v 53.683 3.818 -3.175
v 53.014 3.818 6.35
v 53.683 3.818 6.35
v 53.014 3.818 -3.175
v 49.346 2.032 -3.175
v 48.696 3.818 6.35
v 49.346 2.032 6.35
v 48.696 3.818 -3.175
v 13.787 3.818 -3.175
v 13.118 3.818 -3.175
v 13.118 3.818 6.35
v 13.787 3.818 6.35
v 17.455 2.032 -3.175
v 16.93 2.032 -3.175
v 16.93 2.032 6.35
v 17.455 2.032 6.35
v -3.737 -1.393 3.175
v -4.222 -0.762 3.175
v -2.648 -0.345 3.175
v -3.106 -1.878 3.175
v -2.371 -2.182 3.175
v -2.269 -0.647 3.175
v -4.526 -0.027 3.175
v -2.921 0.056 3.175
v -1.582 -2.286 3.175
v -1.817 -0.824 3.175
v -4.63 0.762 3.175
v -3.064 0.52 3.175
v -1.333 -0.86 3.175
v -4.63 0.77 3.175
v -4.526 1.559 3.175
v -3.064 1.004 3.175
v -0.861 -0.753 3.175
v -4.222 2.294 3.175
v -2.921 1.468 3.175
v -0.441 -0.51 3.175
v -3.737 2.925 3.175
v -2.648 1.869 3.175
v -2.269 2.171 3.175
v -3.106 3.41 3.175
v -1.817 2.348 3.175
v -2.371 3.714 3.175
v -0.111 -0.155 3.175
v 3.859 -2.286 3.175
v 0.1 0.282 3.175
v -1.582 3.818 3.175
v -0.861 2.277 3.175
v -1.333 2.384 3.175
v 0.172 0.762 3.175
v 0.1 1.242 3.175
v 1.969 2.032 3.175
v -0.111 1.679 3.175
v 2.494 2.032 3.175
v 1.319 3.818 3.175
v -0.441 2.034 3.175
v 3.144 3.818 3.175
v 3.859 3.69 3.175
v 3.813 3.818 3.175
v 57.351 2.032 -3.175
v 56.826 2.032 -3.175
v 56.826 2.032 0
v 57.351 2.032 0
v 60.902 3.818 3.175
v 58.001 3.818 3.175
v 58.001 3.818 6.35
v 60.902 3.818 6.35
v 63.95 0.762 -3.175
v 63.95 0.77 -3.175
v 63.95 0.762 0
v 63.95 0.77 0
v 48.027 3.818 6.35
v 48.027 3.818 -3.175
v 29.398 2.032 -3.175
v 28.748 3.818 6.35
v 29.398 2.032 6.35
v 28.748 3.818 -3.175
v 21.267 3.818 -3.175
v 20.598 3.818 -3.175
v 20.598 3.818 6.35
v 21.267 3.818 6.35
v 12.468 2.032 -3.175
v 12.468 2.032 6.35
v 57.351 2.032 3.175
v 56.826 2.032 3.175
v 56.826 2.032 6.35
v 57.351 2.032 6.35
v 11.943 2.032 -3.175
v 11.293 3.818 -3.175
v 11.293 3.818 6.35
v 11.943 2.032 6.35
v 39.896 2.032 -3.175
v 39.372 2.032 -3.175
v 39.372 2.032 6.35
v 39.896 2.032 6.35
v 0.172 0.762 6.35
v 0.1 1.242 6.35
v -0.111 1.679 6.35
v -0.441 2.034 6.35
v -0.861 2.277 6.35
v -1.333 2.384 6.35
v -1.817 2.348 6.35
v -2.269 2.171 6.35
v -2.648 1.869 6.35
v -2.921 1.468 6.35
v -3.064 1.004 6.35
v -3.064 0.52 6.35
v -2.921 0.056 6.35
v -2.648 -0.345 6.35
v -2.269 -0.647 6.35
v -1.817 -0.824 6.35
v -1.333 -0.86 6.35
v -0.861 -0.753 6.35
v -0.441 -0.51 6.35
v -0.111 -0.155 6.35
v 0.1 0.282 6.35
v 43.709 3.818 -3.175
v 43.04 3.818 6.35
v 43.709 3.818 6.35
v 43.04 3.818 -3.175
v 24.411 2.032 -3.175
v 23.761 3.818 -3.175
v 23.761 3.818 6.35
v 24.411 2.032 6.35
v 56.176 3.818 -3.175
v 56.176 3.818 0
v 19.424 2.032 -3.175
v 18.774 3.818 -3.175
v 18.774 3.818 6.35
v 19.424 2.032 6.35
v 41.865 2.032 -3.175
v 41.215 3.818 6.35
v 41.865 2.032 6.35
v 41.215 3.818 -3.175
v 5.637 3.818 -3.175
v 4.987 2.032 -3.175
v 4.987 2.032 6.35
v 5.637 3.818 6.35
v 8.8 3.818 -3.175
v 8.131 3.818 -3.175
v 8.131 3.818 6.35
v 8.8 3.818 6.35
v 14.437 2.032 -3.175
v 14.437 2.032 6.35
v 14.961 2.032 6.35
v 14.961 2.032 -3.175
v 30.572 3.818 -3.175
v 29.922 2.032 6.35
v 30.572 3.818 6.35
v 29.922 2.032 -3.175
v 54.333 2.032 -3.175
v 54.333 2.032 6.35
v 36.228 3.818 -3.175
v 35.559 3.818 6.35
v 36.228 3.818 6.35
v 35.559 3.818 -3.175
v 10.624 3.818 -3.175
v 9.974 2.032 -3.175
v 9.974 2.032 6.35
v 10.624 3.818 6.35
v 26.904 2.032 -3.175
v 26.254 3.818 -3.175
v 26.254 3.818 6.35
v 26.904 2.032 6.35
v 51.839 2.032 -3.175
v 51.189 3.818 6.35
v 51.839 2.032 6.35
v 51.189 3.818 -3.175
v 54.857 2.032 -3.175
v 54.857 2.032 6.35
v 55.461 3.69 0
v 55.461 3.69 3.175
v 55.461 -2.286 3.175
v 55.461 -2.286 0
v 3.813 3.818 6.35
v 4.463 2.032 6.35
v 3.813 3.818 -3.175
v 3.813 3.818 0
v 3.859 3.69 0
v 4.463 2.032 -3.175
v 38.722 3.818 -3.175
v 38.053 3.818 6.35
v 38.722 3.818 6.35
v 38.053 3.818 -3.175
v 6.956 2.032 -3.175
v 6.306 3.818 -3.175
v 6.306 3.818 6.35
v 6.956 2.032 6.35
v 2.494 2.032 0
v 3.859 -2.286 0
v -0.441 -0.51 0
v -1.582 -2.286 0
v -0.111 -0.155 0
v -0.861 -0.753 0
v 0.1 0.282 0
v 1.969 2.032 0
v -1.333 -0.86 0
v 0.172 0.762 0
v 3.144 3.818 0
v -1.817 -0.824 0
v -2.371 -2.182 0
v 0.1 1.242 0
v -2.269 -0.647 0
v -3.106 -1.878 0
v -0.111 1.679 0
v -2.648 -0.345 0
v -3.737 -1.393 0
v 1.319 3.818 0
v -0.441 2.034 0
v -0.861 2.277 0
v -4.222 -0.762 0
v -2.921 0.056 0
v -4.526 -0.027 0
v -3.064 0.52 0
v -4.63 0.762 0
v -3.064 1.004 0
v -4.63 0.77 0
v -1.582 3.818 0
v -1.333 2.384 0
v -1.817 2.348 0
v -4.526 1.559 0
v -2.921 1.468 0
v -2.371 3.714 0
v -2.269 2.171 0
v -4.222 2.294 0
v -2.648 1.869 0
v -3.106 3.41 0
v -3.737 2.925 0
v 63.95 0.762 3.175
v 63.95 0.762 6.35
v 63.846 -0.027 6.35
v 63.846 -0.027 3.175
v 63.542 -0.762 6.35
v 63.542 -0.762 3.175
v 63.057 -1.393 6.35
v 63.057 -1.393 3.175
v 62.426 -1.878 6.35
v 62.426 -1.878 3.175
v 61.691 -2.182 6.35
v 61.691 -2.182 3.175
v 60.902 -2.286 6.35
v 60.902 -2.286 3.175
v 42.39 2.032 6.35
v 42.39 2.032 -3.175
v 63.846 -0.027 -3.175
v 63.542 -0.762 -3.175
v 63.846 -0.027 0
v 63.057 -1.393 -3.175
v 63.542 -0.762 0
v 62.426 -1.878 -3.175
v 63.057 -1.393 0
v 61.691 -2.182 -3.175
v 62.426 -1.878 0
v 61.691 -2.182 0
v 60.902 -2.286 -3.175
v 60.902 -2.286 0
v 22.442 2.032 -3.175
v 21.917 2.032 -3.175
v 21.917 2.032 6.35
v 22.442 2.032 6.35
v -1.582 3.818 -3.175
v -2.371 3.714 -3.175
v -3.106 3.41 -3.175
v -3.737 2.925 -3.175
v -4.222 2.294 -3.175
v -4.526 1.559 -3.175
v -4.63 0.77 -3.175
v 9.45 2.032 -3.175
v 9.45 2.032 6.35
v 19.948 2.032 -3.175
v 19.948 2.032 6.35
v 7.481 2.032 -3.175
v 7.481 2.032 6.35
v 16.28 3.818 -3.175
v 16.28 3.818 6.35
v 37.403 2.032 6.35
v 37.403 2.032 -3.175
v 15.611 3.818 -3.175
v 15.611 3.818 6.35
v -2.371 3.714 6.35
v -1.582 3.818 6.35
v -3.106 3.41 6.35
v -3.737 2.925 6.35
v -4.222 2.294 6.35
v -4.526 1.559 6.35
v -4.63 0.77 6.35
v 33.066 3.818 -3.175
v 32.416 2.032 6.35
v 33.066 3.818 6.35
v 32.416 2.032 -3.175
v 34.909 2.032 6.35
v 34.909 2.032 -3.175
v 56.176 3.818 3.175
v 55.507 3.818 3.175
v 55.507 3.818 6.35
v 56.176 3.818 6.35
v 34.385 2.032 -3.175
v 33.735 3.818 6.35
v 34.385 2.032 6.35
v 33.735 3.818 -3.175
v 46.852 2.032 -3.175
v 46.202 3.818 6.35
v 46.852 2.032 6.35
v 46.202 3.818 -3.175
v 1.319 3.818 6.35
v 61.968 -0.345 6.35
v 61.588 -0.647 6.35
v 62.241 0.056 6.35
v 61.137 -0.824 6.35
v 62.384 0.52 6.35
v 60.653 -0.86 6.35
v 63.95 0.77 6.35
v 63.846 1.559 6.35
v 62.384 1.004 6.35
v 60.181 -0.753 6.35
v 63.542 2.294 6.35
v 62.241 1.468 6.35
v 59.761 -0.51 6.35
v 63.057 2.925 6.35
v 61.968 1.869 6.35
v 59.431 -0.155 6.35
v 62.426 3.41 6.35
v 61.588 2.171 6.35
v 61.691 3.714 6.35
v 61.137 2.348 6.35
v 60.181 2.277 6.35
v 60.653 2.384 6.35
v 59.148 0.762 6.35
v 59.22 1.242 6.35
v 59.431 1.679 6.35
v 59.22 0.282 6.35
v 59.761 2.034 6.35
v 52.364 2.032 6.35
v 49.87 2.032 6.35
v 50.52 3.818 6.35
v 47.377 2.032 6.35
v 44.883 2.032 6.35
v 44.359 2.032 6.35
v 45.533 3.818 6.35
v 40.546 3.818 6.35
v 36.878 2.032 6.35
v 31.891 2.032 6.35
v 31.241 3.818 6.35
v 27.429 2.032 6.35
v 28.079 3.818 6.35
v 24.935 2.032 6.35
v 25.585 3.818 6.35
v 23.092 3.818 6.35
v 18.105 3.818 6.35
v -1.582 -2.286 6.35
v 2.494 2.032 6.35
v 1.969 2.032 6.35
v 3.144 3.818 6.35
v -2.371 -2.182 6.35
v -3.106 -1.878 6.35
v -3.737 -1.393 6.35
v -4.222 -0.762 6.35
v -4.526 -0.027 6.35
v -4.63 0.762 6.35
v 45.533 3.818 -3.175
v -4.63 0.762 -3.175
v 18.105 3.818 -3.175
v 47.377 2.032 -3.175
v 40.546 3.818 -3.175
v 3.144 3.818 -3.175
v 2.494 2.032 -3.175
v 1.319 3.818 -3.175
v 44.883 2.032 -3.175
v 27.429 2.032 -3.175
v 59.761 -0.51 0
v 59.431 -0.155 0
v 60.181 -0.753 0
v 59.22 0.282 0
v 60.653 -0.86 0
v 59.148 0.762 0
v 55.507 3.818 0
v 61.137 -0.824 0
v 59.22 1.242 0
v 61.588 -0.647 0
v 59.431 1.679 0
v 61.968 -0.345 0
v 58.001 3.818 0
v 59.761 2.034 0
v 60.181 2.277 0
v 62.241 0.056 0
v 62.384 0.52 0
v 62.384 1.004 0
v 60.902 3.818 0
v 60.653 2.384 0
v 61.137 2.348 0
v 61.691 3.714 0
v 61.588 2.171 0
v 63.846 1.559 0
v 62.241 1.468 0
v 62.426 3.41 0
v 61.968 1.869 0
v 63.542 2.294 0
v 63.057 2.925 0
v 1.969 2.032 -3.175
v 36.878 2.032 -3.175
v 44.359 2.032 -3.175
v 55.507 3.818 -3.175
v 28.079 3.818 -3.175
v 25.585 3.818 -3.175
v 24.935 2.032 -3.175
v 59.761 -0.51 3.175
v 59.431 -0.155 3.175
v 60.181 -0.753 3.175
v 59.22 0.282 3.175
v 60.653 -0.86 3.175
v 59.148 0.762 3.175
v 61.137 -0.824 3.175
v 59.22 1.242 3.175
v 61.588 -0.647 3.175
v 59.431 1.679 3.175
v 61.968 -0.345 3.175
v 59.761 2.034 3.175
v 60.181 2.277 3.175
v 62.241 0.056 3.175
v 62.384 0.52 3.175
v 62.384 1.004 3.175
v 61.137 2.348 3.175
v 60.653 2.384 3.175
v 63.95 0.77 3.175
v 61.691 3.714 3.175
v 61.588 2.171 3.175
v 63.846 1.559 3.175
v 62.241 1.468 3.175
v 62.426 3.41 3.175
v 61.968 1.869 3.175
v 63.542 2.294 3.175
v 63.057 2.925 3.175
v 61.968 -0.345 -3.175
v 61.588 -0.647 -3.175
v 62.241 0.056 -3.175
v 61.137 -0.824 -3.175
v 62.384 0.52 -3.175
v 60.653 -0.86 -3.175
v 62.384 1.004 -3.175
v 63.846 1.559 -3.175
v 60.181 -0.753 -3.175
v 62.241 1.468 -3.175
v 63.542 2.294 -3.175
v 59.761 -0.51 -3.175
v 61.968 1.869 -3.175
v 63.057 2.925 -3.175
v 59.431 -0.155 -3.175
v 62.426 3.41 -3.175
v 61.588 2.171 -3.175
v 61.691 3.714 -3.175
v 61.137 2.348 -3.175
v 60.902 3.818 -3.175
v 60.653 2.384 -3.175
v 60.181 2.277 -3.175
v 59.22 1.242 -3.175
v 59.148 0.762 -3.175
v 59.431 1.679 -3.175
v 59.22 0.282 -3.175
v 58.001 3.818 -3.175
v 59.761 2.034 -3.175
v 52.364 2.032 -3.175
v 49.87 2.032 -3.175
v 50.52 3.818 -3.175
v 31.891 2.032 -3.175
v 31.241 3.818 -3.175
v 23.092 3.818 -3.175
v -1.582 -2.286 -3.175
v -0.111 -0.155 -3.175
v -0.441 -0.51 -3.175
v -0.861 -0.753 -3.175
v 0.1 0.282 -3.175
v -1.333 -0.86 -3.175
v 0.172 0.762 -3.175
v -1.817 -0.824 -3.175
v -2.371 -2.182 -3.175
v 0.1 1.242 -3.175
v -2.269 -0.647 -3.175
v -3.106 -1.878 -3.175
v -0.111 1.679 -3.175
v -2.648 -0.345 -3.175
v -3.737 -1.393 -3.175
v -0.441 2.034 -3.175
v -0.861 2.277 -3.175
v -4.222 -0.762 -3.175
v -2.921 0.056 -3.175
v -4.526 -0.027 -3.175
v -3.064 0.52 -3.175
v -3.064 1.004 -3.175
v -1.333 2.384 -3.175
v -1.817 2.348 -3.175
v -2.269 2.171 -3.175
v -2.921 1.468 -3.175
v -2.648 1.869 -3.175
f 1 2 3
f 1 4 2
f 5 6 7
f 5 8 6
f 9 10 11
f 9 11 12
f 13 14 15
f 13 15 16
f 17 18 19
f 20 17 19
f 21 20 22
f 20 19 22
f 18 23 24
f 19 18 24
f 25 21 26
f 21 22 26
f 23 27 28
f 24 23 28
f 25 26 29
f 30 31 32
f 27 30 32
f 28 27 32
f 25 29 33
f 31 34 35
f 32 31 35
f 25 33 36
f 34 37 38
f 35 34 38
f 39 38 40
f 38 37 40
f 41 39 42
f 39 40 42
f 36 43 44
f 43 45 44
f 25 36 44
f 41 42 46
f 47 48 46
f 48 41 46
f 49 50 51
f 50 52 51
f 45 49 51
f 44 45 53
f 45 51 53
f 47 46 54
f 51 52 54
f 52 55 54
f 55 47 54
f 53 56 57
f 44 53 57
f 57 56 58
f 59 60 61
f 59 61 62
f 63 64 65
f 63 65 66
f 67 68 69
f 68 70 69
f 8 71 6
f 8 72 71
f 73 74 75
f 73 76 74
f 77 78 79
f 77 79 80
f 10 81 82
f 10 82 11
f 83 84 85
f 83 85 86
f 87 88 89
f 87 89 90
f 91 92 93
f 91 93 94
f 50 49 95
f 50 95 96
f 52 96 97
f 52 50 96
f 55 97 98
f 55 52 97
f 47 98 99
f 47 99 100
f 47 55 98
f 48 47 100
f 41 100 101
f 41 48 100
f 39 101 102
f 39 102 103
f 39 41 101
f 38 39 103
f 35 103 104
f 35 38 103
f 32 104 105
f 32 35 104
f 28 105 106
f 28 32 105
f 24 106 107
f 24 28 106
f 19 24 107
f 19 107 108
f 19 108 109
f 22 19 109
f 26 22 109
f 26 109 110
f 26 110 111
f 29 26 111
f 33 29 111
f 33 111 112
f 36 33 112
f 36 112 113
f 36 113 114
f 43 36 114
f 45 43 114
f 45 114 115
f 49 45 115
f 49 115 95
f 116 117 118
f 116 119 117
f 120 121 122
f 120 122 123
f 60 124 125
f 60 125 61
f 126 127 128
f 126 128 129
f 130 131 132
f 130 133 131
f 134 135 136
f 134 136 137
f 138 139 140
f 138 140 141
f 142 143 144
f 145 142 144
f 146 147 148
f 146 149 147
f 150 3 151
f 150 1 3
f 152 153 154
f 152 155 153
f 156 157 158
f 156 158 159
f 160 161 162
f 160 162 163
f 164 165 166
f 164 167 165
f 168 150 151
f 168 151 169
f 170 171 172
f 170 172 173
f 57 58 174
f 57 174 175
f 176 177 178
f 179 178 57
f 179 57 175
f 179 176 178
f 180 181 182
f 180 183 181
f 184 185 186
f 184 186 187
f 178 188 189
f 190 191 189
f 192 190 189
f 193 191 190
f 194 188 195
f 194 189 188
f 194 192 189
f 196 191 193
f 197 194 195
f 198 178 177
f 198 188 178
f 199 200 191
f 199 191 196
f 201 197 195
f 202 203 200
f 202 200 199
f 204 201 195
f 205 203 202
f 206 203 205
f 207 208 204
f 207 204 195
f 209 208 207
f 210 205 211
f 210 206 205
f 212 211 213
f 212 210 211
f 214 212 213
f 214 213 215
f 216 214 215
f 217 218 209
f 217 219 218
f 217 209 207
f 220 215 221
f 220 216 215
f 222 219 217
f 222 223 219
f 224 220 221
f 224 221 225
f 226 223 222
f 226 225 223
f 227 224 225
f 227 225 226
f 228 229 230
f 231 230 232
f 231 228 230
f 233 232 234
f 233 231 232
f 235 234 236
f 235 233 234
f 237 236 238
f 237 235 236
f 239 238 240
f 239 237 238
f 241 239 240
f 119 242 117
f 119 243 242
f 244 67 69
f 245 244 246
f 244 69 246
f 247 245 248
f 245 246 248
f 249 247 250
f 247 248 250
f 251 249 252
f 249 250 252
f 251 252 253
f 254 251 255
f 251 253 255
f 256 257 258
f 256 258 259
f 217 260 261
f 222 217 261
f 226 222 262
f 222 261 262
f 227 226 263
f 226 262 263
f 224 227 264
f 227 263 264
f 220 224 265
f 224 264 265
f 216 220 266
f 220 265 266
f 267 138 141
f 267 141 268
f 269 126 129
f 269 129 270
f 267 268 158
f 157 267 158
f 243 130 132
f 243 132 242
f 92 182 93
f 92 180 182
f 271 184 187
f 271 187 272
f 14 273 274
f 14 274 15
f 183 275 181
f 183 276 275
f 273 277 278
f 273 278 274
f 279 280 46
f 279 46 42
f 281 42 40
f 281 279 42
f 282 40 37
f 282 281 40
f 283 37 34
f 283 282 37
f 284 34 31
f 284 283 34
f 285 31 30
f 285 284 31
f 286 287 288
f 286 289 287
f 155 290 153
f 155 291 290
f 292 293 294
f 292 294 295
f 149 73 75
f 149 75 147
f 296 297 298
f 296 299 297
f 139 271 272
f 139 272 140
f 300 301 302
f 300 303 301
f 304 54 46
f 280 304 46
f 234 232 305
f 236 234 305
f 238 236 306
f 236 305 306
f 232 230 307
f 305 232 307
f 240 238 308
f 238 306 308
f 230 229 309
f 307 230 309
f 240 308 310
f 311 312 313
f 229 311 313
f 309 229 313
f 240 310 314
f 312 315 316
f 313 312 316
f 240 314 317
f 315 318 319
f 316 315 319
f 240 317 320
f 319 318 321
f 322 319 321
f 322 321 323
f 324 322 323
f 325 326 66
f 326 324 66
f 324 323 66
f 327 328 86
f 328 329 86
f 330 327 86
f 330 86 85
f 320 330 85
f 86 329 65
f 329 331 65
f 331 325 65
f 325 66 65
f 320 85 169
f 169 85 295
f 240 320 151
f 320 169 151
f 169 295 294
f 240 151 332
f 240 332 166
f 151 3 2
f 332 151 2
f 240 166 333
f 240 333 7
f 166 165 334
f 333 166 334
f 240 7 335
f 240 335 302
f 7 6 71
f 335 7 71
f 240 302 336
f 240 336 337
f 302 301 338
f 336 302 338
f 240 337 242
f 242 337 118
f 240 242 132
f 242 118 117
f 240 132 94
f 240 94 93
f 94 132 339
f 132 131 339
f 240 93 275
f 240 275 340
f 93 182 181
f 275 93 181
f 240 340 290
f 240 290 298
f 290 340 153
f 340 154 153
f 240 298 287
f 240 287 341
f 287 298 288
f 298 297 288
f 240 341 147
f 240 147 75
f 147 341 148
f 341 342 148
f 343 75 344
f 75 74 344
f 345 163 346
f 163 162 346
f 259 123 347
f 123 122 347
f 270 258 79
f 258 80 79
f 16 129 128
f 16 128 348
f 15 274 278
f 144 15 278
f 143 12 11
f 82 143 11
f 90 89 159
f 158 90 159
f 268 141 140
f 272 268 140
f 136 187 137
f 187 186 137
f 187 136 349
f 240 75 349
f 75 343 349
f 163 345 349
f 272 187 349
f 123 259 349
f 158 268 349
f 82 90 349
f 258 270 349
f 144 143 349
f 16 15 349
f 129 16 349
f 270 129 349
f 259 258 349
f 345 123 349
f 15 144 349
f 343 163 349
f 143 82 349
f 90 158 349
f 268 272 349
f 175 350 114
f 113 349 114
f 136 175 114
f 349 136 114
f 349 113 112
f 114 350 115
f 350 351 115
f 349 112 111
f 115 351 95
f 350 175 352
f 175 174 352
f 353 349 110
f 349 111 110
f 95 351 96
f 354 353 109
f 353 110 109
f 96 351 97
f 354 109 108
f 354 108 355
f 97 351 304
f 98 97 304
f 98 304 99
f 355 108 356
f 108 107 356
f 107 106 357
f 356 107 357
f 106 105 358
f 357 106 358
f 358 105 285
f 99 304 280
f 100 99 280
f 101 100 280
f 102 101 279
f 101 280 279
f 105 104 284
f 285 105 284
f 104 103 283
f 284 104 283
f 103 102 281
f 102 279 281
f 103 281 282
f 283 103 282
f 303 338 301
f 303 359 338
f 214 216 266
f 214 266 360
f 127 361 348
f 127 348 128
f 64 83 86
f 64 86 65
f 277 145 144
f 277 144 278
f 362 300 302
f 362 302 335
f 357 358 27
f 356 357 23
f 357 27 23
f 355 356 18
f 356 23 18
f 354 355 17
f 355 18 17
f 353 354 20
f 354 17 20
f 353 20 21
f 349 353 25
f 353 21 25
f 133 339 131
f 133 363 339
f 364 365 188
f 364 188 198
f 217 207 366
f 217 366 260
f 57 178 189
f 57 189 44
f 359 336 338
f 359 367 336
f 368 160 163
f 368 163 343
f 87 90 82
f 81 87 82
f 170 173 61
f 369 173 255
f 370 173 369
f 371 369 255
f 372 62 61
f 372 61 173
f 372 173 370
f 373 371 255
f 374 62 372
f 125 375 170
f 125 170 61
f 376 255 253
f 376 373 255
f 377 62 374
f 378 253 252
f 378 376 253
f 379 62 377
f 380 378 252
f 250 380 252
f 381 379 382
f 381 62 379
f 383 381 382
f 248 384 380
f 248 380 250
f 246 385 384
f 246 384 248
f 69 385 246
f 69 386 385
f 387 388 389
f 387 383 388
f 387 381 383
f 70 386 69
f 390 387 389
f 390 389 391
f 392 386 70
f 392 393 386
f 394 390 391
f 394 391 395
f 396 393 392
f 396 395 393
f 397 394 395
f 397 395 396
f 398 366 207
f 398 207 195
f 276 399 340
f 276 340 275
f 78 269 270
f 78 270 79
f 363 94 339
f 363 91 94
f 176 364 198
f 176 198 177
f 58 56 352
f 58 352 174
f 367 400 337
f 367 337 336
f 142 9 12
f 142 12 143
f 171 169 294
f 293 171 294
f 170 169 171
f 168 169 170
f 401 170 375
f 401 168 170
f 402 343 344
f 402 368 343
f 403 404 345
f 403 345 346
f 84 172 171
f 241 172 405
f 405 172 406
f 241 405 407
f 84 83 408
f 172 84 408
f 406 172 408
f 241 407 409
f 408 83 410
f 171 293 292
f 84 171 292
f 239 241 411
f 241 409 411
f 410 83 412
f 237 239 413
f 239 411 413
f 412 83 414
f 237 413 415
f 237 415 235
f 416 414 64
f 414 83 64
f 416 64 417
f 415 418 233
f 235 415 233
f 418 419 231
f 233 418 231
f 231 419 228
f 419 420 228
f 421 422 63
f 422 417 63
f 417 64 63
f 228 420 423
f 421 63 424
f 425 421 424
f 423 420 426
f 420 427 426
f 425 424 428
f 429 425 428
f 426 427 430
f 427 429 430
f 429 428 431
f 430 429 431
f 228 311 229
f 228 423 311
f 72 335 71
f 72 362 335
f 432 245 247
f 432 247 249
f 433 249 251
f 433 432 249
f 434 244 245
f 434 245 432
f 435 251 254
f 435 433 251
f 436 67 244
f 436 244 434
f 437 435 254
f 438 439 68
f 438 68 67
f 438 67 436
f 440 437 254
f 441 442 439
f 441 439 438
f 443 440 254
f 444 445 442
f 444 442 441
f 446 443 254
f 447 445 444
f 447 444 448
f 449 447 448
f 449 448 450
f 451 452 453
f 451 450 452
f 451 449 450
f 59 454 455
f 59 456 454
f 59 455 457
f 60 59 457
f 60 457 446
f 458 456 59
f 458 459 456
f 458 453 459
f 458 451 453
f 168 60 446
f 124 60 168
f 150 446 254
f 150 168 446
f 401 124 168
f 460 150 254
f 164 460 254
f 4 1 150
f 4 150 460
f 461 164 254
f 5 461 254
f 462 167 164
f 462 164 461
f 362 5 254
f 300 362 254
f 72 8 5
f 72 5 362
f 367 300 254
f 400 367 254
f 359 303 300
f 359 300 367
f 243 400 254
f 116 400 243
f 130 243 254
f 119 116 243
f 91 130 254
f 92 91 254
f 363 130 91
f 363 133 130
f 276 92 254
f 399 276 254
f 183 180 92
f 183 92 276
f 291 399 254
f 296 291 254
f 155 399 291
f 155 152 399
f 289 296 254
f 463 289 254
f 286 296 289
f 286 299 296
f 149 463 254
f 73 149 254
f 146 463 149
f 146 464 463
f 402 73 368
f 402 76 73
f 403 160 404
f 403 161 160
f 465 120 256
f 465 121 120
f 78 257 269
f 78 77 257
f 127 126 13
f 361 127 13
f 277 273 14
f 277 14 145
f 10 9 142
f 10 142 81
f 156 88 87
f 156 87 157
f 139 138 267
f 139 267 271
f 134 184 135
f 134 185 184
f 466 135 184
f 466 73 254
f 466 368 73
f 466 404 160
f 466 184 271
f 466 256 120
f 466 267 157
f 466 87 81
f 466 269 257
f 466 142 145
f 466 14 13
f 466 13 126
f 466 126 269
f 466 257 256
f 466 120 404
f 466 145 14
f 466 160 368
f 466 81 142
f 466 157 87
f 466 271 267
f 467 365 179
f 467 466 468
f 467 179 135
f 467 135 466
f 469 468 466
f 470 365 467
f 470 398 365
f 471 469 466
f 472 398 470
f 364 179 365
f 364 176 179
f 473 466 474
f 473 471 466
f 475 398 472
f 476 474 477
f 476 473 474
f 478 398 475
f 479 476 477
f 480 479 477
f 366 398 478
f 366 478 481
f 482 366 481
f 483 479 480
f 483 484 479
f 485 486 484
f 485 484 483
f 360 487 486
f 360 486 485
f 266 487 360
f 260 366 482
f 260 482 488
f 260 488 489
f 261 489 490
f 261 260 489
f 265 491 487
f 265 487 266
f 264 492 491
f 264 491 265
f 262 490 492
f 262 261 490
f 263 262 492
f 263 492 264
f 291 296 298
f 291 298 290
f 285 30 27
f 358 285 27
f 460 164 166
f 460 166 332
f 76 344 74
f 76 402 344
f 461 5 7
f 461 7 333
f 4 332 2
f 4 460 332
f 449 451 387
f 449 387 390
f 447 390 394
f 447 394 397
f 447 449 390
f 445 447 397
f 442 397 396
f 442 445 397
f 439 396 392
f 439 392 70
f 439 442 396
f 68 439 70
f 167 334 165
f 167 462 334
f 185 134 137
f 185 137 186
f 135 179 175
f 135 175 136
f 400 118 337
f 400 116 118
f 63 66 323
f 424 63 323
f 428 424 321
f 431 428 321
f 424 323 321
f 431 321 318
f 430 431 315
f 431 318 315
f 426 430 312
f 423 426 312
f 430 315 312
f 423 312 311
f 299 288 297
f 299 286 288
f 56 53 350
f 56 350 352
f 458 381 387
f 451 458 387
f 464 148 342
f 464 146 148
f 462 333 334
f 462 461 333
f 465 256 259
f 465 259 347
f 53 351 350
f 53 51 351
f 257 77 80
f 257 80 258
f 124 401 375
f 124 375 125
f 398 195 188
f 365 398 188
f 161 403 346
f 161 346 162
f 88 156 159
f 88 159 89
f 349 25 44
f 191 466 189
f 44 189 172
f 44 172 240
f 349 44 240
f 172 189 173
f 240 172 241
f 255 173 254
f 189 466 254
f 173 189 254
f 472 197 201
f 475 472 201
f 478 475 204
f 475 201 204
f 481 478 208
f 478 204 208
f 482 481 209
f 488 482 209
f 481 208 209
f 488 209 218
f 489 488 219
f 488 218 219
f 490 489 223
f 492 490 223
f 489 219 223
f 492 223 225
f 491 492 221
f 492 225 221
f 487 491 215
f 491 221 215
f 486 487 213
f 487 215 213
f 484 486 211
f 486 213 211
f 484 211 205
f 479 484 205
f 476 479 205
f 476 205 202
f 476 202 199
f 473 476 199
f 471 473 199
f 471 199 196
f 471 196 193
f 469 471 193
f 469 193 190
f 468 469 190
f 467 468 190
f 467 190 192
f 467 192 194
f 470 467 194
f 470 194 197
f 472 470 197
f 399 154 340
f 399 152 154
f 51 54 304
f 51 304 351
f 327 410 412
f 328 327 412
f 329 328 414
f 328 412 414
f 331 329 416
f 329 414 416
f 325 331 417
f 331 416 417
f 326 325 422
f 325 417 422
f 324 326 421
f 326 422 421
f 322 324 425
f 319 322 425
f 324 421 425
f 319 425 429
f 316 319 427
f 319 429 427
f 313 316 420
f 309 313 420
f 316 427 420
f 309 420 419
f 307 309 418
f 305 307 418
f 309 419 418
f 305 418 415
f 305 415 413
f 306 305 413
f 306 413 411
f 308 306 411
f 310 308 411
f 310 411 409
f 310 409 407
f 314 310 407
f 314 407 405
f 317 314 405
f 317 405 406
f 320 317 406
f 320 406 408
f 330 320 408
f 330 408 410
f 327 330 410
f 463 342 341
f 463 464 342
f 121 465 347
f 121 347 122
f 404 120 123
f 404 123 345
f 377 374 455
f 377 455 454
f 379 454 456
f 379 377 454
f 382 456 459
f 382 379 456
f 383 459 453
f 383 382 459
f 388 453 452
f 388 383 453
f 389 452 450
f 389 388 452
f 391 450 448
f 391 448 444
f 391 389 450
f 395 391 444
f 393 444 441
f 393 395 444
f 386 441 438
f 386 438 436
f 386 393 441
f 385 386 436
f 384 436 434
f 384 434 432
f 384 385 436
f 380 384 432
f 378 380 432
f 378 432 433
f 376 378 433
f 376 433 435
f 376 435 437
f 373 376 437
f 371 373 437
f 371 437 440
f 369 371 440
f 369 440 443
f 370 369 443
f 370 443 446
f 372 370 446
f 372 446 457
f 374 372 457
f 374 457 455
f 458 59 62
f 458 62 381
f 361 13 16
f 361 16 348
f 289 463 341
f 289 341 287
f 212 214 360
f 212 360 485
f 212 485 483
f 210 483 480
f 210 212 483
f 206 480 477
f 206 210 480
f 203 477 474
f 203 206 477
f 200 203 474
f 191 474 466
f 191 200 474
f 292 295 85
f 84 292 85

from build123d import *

# Parameters (mm, degrees)
SKETCH6_W            = 62.23
SKETCH6_H            = 2.032
BOSS_EXTRUDE2_DEPTH  = 3.175
BOSS_EXTRUDE3_DEPTH  = 3.175
LPATTERN2_COUNT      = 24
LPATTERN2_PITCH      = 2.493518
SKETCH9_W            = 2.910078
SKETCH9_H            = 2.032
CUT_EXTRUDE1_DEPTH   = 3.175
SKETCH10_W           = 59.319922
SKETCH10_H           = 6.35
BOSS_EXTRUDE4_DEPTH  = 0.508
SKETCH11_W           = 68.58
SKETCH11_H           = 2.54
BOSS_EXTRUDE5_DEPTH  = 6.35
SKETCH12_W           = 6.35
SKETCH12_H           = 6.35
BOSS_EXTRUDE6_DEPTH  = 1.778
SKETCH14_W           = 31.115
SKETCH14_H           = 1.778
BOSS_EXTRUDE7_DEPTH  = 6.35
CUT_EXTRUDE2_REACH   = 66.378
SKETCH13_R           = 1.627
FILLET1_R            = 3.048
FILLET1_OF_MIRROR4_R = 3.048
CUT_EXTRUDE3_REACH   = 66.319
SKETCH16_W           = 5.94905084
SKETCH16_H           = 3.175
CUT_EXTRUDE4_REACH   = 66.241
SKETCH18_W           = 74.285931649
SKETCH18_H           = 23.332469726
SKETCH19_W           = 3.175
SKETCH19_H           = 6.1039375
CUT_EXTRUDE5_DEPTH   = 2.54
SKETCH20_W           = 3.175
SKETCH20_H           = 6.1039375
CUT_EXTRUDE6_DEPTH   = 2.54


with BuildPart() as part:
    # Sketch6 → Boss-Extrude2 (new, symmetric)
    with BuildSketch(Plane.XY):
        with Locations((31.115, 1.016)):
            Rectangle(SKETCH6_W, SKETCH6_H)
    extrude(amount=BOSS_EXTRUDE2_DEPTH, both=True)

    # Sketch7 → Boss-Extrude3 (add, symmetric)
    with BuildSketch(Plane.XY):
        Polygon((1.31901184, 3.8179375), (1.969008, 2.032), (0, 2.032), (0.64999616, 3.8179375), align=None)
    boss_extrude3 = extrude(amount=BOSS_EXTRUDE3_DEPTH, both=True)

    # LPattern2: Boss-Extrude3 ×24
    with Locations(*[(i * LPATTERN2_PITCH, 0, 0) for i in range(1, LPATTERN2_COUNT)]):
        add(boss_extrude3)

    # Sketch9 → Cut-Extrude1 (cut, symmetric)
    with BuildSketch(Plane.XY):
        with Locations((60.774961, 1.016)):
            Rectangle(SKETCH9_W, SKETCH9_H)
    extrude(amount=CUT_EXTRUDE1_DEPTH, both=True, mode=Mode.SUBTRACT)

    # Sketch10 → Boss-Extrude4 (add)
    with BuildSketch(Plane.XZ):
        with Locations((29.659961, 0)):
            Rectangle(SKETCH10_W, SKETCH10_H)
    extrude(amount=BOSS_EXTRUDE4_DEPTH)

    # Sketch11 → Boss-Extrude5 (add)
    with BuildSketch(Plane.XY.offset(3.175)):
        with Locations((29.659961, 0.762)):
            Rectangle(SKETCH11_W, SKETCH11_H)
    extrude(amount=-BOSS_EXTRUDE5_DEPTH)

    # Sketch12 → Boss-Extrude6 (add)
    with BuildSketch(Plane.XZ.offset(0.508)):
        with Locations((-1.455039, 0)):
            Rectangle(SKETCH12_W, SKETCH12_H)
    boss_extrude6 = extrude(amount=BOSS_EXTRUDE6_DEPTH)

    # Sketch14 → Boss-Extrude7 (add)
    with BuildSketch(Plane.XY.offset(3.175)):
        Polygon((-4.630039, 2.92496875), (-4.630039, 2.032), (0, 2.032), (0.32499808, 2.92496875), (0.64999616, 3.8179375), (-4.630039, 3.8179375), align=None)
        with Locations((17.277461, -1.397)):
            Rectangle(SKETCH14_W, SKETCH14_H)
    boss_extrude7 = extrude(amount=-BOSS_EXTRUDE7_DEPTH)

    # Sketch13 → Cut-Extrude2 (cut, up to next)
    with BuildSketch(Plane.XY.offset(3.175), mode=Mode.PRIVATE) as cut_extrude2_sk1:
        with Locations((-1.455039, 0.762)):
            Circle(SKETCH13_R)
    cut_extrude2_tool1 = extrude(cut_extrude2_sk1.sketch, amount=-CUT_EXTRUDE2_REACH, mode=Mode.PRIVATE) & part.part
    cut_extrude2 = cut_extrude2_tool1.solids().sort_by_distance((-1.455039, 0.762, 3.175))[0]
    add(cut_extrude2, mode=Mode.SUBTRACT)

    # Fillet1
    fillet1_edges = [part.edges().sort_by_distance(p)[0] for p in [
        (-4.630039, -2.286, 0),
        (-4.630039, 3.8179375, 0),
    ]]
    fillet(fillet1_edges, radius=FILLET1_R)

    # Mirror4: Boss-Extrude6, Boss-Extrude7, Cut-Extrude2 across plane
    add(boss_extrude6.mirror(Plane.ZY.offset(-29.659961)))
    add(boss_extrude7.mirror(Plane.ZY.offset(-29.659961)))
    add(cut_extrude2.mirror(Plane.ZY.offset(-29.659961)), mode=Mode.SUBTRACT)

    # Fillet1 of Mirror4
    fillet1_of_mirror4_edges = [part.edges().sort_by_distance(p)[0] for p in [
        (63.949961, -2.286, 0),
        (63.949961, 3.8179375, 0),
    ]]
    fillet(fillet1_of_mirror4_edges, radius=FILLET1_OF_MIRROR4_R)

    # Sketch16 → Cut-Extrude3 (cut, up to next)
    with BuildSketch(Plane(origin=(0, 3.8179375, 0), x_dir=(1, 0, 0), z_dir=(0, 1, 0)), mode=Mode.PRIVATE) as cut_extrude3_sk1:
        with Locations((-1.65551358, -1.5875)):
            Rectangle(SKETCH16_W, SKETCH16_H)
    cut_extrude3_tool1 = extrude(cut_extrude3_sk1.sketch, amount=-CUT_EXTRUDE3_REACH, mode=Mode.PRIVATE) & part.part
    # Sketch16 → Cut-Extrude3 (cut, up to next)
    with BuildSketch(Plane(origin=(0, 3.8179375, 0), x_dir=(1, 0, 0), z_dir=(0, 1, 0)), mode=Mode.PRIVATE) as cut_extrude3_sk2:
        with Locations((60.97543558, -1.5875)):
            Rectangle(SKETCH16_W, SKETCH16_H)
    cut_extrude3_tool2 = extrude(cut_extrude3_sk2.sketch, amount=-CUT_EXTRUDE3_REACH, mode=Mode.PRIVATE) & part.part
    add(cut_extrude3_tool1.solids().sort_by_distance((-1.655514, 3.817937, 1.5875))[0], mode=Mode.SUBTRACT)
    add(cut_extrude3_tool2.solids().sort_by_distance((60.975436, 3.817937, 1.5875))[0], mode=Mode.SUBTRACT)

    # Sketch18 → Cut-Extrude4 (cut, up to next)
    with BuildSketch(Plane.XY.offset(1.5875), mode=Mode.PRIVATE) as cut_extrude4_sk1:
        with Locations((31.985939291, 1.965301306)):
            Rectangle(SKETCH18_W, SKETCH18_H)
    cut_extrude4_tool1 = extrude(cut_extrude4_sk1.sketch, amount=CUT_EXTRUDE4_REACH, mode=Mode.PRIVATE) & part.part
    add(cut_extrude4_tool1.solids().sort_by_distance((31.985939, 1.965301, 1.5875))[0], mode=Mode.SUBTRACT)

    # Mirror11: part across plane


with BuildPart() as part_1:
    add(part.part)
    add(part.part.mirror(Plane.XY.offset(1.5875)))

    # Sketch19 → Cut-Extrude5 (cut)
    with BuildSketch(Plane(origin=(58.00091016, 0, 0), x_dir=(0, 0, -1), z_dir=(1, 0, 0))):
        with Locations((-1.5875, 0.76596875)):
            Rectangle(SKETCH19_W, SKETCH19_H)
    extrude(amount=-CUT_EXTRUDE5_DEPTH, mode=Mode.SUBTRACT)

    # Sketch20 → Cut-Extrude6 (cut)
    with BuildSketch(Plane.ZY.offset(-1.31901184)):
        with Locations((1.5875, 0.76596875)):
            Rectangle(SKETCH20_W, SKETCH20_H)
    extrude(amount=-CUT_EXTRUDE6_DEPTH, mode=Mode.SUBTRACT)


solid = part_1.part
